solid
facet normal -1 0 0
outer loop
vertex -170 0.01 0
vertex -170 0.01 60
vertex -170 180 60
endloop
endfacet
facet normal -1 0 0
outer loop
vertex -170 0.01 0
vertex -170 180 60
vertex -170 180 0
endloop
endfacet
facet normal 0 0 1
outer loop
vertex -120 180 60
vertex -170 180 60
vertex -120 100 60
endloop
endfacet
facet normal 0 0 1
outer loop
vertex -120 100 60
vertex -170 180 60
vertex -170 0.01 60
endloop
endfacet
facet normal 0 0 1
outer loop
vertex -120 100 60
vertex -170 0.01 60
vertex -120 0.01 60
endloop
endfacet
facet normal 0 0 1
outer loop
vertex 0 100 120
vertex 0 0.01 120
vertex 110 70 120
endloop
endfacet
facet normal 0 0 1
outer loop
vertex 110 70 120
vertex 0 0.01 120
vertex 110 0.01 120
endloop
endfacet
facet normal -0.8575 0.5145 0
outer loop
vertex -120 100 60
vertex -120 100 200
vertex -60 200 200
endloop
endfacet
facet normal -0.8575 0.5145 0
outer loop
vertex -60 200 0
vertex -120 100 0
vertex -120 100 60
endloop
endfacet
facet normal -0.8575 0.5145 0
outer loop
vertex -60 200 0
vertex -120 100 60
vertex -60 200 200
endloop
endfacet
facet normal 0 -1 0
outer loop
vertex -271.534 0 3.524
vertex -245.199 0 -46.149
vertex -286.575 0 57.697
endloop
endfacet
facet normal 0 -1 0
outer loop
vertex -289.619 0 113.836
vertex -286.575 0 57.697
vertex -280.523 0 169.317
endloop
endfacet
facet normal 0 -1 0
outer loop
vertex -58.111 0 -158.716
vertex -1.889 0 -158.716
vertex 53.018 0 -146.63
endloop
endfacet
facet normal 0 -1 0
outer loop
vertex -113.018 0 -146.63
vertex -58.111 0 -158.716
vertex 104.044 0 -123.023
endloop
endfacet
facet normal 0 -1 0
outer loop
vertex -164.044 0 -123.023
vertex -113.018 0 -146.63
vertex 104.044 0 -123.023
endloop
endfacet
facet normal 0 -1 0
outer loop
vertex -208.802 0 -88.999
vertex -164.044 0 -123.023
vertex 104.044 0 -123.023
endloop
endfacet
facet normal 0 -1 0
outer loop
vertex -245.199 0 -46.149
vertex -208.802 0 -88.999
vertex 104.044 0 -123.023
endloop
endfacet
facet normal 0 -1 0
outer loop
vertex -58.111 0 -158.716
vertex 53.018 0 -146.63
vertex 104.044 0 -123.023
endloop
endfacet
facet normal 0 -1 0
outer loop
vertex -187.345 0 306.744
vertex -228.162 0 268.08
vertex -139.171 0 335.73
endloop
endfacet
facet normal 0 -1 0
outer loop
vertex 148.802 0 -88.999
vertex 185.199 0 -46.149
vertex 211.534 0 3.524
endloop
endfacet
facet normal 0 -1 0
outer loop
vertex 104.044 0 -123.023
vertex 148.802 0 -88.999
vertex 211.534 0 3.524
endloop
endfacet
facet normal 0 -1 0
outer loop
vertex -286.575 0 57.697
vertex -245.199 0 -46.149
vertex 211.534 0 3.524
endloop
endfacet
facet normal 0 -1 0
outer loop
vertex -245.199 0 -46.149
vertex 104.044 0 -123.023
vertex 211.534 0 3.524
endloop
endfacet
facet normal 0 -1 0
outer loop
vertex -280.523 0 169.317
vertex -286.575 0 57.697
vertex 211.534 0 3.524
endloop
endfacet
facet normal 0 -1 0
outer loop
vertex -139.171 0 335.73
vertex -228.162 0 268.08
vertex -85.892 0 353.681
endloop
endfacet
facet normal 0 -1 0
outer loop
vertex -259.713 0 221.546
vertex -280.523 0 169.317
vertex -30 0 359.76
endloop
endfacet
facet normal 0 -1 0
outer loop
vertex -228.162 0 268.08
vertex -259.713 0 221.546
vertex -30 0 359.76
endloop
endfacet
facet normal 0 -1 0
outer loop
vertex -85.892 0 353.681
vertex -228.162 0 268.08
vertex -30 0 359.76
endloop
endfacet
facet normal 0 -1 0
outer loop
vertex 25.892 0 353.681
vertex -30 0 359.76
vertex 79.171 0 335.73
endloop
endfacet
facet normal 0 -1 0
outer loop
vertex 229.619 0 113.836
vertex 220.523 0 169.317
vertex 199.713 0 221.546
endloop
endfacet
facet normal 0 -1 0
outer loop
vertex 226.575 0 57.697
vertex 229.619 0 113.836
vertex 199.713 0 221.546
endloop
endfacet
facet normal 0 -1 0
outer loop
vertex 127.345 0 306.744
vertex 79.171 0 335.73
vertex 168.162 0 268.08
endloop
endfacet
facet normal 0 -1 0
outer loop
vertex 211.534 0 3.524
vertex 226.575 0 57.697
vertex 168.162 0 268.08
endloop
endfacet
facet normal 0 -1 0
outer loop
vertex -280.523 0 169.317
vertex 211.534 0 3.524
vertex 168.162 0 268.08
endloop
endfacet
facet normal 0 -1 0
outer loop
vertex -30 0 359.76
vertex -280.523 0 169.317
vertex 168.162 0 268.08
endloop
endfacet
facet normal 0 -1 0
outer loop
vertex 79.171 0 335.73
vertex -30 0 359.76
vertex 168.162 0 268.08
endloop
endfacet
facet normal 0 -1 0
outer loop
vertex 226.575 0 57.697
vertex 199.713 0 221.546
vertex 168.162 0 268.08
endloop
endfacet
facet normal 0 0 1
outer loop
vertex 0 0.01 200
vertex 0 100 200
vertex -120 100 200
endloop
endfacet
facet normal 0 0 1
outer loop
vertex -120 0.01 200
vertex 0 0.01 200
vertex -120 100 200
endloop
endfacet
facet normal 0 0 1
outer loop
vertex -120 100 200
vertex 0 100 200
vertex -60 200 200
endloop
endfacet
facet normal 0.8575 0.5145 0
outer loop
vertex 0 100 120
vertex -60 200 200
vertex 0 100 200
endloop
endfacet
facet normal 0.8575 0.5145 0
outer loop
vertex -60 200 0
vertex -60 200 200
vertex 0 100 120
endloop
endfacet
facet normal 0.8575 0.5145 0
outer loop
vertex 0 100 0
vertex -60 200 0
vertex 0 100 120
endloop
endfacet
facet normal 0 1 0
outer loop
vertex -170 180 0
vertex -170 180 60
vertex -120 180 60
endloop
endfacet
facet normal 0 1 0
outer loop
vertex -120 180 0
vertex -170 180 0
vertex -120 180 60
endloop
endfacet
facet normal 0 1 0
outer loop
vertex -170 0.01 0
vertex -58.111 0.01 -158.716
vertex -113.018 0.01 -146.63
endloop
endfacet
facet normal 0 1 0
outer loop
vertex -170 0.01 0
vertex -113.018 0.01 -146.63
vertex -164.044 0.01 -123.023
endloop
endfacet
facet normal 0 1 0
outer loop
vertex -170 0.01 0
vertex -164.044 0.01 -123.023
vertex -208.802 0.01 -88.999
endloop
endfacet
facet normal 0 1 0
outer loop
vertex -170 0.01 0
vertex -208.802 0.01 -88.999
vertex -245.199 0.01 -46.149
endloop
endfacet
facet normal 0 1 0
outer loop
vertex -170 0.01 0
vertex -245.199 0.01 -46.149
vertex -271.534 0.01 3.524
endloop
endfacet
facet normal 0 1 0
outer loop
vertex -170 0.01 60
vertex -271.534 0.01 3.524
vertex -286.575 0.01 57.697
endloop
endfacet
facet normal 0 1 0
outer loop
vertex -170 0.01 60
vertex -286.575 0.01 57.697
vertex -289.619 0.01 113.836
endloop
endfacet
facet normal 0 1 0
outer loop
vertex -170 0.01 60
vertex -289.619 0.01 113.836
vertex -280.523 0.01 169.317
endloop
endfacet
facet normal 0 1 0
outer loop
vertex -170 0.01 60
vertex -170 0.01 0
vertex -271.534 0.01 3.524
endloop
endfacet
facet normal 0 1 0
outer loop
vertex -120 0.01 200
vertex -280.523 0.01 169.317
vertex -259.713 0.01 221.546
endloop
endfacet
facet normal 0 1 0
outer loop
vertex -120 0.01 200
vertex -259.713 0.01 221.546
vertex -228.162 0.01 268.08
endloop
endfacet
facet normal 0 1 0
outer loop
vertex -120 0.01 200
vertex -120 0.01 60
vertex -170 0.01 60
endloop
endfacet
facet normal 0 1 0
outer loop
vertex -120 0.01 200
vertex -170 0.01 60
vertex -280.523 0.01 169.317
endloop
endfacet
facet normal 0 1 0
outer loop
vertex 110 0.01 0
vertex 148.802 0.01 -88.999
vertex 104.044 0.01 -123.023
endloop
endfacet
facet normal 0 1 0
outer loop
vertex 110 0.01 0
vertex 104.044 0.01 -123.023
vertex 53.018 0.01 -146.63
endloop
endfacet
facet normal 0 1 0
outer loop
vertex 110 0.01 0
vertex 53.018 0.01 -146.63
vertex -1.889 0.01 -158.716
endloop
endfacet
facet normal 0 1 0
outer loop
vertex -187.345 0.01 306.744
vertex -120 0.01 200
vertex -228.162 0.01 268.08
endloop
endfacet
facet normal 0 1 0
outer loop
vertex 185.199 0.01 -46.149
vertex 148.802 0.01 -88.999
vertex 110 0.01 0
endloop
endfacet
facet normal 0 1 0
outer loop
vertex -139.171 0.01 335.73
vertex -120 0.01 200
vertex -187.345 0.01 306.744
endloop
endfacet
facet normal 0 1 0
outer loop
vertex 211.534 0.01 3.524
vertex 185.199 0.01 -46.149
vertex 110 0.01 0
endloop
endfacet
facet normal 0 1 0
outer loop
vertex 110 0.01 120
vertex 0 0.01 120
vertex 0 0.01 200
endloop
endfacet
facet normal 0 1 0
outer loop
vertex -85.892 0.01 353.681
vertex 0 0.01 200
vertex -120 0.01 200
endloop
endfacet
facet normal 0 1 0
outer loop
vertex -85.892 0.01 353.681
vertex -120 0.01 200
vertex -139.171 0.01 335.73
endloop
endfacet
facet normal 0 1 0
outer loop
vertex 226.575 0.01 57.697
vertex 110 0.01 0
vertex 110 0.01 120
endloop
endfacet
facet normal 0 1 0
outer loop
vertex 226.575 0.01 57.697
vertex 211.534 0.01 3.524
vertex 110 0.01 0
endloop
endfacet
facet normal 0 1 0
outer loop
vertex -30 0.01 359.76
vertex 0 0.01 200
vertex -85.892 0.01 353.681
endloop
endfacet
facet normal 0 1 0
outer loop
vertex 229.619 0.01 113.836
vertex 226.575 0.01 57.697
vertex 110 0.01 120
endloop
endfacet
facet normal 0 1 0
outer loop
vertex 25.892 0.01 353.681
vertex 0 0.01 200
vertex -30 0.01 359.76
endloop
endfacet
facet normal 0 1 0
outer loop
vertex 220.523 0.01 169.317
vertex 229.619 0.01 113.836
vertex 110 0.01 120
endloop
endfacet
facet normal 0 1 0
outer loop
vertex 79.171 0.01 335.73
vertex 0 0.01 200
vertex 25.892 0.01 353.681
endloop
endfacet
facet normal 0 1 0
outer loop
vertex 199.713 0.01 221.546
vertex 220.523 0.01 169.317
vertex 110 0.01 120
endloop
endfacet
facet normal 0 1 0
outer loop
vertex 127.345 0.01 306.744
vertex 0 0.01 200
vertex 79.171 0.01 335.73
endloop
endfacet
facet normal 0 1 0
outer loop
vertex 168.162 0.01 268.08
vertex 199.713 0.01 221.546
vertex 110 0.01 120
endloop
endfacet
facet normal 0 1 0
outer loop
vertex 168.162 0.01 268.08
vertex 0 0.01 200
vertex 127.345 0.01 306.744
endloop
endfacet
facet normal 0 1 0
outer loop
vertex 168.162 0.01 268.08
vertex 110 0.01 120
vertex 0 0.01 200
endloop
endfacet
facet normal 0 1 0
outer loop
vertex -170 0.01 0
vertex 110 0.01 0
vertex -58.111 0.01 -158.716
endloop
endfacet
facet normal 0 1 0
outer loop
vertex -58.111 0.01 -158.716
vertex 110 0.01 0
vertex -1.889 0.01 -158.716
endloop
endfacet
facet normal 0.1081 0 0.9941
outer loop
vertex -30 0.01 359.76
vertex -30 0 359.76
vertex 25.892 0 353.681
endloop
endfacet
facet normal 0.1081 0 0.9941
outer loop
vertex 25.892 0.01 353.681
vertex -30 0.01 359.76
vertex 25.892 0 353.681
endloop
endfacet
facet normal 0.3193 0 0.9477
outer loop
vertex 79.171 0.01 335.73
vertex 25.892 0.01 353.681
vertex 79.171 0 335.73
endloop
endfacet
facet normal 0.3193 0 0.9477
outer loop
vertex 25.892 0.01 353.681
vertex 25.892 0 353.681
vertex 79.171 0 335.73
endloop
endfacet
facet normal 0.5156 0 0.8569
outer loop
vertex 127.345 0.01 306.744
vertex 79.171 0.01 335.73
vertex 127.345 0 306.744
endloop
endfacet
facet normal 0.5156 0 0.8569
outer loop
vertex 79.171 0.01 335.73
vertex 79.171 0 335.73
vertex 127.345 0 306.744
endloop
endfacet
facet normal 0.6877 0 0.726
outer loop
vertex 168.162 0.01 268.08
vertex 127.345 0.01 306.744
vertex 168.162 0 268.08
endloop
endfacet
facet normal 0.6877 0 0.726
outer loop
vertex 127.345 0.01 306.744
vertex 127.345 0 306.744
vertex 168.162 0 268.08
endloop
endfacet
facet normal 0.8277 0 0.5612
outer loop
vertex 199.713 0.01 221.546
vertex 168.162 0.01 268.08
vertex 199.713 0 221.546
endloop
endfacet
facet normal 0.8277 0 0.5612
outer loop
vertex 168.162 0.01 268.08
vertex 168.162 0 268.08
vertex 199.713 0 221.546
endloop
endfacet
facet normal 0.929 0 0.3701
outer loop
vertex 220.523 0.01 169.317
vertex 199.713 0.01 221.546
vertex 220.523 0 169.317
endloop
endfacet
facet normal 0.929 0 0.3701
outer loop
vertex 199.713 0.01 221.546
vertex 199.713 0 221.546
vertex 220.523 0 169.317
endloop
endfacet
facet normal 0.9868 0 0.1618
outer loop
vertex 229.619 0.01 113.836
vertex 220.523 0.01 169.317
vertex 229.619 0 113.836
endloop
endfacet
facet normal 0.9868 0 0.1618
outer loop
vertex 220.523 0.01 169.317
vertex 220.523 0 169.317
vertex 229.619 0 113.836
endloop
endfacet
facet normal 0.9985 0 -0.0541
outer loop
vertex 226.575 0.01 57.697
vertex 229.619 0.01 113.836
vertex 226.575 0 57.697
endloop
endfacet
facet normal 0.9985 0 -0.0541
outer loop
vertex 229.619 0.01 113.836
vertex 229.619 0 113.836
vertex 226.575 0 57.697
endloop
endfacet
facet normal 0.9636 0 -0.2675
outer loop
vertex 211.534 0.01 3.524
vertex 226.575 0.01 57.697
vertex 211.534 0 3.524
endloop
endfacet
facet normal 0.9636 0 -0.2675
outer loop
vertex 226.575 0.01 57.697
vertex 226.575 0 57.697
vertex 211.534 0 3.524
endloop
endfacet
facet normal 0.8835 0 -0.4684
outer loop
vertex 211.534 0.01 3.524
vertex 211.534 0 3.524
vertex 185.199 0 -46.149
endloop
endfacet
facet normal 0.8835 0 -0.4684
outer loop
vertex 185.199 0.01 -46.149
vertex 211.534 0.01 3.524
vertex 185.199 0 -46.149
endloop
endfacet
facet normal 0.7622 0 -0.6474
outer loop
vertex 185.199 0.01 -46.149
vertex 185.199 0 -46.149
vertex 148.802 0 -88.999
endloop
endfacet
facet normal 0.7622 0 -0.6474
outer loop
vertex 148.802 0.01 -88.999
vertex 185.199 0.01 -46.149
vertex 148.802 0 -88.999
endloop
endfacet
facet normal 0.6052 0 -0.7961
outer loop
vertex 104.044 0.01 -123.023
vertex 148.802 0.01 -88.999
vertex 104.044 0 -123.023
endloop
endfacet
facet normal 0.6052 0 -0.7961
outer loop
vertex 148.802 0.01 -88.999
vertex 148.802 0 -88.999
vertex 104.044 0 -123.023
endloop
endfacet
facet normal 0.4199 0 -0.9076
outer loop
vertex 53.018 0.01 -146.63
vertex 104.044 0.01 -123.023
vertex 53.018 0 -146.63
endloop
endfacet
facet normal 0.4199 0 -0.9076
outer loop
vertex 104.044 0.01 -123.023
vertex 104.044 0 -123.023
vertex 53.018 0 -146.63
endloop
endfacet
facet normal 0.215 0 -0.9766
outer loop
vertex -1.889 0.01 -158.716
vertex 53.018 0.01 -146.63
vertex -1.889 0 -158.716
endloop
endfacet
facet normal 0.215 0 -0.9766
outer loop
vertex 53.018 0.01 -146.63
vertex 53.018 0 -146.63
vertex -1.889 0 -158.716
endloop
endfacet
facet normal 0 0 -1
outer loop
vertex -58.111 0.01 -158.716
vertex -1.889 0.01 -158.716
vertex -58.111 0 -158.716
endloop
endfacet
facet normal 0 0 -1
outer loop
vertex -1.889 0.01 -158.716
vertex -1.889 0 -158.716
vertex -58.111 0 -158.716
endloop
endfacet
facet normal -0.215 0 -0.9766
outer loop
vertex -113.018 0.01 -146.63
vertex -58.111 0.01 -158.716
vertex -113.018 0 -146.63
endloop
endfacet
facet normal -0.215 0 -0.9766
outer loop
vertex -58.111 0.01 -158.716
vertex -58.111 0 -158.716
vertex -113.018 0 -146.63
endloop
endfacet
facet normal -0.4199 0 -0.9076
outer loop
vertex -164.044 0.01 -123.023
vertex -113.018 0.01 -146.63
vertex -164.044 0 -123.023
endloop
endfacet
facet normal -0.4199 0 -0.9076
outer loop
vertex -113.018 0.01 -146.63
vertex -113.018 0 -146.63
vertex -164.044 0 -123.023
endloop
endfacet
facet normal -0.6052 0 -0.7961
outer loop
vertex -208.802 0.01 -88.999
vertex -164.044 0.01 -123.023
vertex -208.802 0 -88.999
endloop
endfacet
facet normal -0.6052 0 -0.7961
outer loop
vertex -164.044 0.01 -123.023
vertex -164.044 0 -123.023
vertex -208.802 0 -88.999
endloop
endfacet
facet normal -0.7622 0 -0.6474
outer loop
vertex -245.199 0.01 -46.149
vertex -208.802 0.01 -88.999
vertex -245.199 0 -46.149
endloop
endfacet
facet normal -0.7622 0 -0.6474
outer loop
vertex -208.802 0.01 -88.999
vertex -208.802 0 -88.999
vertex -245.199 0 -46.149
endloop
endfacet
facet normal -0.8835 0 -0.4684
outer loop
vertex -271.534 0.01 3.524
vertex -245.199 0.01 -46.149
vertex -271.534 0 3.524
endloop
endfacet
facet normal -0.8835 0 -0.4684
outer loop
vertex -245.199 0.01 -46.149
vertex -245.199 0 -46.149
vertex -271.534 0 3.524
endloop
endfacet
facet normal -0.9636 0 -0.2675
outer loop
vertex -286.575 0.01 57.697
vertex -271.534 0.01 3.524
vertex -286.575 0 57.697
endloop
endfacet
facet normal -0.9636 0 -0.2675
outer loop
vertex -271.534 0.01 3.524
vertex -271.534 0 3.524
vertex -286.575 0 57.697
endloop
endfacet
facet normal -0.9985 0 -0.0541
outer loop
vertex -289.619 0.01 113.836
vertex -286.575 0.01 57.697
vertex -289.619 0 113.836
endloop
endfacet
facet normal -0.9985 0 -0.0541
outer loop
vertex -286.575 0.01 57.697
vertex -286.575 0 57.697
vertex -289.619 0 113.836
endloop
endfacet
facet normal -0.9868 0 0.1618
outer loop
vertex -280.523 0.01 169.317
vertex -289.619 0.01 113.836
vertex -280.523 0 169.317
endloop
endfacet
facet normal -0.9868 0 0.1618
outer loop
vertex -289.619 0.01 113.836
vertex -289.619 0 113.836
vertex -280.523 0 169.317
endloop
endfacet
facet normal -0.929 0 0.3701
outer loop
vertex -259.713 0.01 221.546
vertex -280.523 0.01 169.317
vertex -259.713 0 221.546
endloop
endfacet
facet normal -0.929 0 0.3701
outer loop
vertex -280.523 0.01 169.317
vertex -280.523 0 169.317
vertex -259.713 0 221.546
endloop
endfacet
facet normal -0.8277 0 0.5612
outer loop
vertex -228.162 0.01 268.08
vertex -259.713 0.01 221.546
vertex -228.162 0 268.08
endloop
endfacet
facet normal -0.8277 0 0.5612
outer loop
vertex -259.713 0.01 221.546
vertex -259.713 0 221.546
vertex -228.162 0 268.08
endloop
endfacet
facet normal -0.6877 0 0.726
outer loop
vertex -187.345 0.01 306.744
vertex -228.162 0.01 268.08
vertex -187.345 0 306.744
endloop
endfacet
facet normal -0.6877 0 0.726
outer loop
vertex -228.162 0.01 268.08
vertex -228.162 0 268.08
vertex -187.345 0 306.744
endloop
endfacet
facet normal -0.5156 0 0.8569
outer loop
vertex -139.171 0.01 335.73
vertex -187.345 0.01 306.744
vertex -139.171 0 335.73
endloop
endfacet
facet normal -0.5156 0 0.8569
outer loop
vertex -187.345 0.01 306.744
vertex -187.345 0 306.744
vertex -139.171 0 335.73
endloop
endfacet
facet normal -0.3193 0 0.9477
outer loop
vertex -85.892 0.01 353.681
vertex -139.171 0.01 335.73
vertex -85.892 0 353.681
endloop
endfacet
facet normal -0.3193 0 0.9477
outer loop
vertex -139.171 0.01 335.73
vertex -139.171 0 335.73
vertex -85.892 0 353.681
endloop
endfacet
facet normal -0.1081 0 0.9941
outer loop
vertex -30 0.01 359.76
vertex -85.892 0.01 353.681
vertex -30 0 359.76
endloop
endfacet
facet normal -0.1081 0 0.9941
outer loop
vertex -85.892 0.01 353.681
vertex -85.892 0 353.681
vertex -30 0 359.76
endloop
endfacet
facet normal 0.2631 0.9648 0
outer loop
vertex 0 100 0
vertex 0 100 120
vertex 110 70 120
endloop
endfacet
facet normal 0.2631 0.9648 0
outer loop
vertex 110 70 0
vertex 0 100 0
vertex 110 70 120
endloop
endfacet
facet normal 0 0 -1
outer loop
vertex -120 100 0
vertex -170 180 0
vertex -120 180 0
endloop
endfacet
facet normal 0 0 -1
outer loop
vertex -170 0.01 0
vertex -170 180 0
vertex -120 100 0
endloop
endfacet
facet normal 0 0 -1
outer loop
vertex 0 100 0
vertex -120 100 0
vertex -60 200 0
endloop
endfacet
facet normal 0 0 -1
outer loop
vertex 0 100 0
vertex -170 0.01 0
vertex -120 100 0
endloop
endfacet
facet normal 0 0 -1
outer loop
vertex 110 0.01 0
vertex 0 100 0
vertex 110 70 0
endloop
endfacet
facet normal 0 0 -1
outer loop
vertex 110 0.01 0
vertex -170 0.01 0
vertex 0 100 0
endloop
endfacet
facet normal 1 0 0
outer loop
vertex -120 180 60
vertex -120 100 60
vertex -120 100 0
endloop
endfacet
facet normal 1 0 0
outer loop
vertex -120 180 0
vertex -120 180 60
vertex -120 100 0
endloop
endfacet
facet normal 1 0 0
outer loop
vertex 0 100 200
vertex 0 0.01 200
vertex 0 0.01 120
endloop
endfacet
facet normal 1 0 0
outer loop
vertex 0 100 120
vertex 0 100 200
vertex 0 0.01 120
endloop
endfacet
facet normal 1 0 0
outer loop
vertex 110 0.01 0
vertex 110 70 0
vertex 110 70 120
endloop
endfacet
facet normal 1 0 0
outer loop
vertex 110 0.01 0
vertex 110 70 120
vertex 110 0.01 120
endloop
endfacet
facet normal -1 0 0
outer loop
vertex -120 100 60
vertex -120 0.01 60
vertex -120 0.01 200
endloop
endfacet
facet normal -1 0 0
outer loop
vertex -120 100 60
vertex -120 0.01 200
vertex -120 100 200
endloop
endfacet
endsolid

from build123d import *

# Parameters (mm, degrees)
EXTRUDE1_DEPTH = 200
SKETCH2_W      = 110
SKETCH2_H      = 80
EXTRUDE2_DEPTH = 200
SKETCH3_W      = 50
SKETCH3_H      = 60
EXTRUDE3_DEPTH = 180
SKETCH4_R      = 260
EXTRUDE4_DEPTH = 0.01


with BuildPart() as part:
    # Sketch1 → Extrude1 (new body)
    with BuildSketch(Plane.XY):
        Polygon((-60, 200), (0, 100), (110, 70), (110, 0), (0, 0), (-120, 0), (-120, 100), align=None)
    extrude(amount=EXTRUDE1_DEPTH)

    # Sketch2 → Extrude2 (cut)
    with BuildSketch(Plane(origin=(0, 0, 0), x_dir=(1, 0, 0), z_dir=(0, 1, 0))):
        with Locations((55, -160)):
            Rectangle(SKETCH2_W, SKETCH2_H)
    extrude(amount=EXTRUDE2_DEPTH, mode=Mode.SUBTRACT)

    # Sketch3 → Extrude3 (add)
    with BuildSketch(Plane(origin=(0, 0, 0), x_dir=(1, 0, 0), z_dir=(0, 1, 0))):
        with Locations((-145, -30)):
            Rectangle(SKETCH3_W, SKETCH3_H)
    extrude(amount=EXTRUDE3_DEPTH)

    # Sketch4 → Extrude4 (add)
    with BuildSketch(Plane(origin=(0, 0, 0), x_dir=(1, 0, 0), z_dir=(0, 1, 0))):
        with Locations(Location((-30, -99.759965953, 0), (0, 0, 270))):  # turned: the seam where the file's is
            Circle(SKETCH4_R)
    extrude(amount=EXTRUDE4_DEPTH)


solid = part.part
